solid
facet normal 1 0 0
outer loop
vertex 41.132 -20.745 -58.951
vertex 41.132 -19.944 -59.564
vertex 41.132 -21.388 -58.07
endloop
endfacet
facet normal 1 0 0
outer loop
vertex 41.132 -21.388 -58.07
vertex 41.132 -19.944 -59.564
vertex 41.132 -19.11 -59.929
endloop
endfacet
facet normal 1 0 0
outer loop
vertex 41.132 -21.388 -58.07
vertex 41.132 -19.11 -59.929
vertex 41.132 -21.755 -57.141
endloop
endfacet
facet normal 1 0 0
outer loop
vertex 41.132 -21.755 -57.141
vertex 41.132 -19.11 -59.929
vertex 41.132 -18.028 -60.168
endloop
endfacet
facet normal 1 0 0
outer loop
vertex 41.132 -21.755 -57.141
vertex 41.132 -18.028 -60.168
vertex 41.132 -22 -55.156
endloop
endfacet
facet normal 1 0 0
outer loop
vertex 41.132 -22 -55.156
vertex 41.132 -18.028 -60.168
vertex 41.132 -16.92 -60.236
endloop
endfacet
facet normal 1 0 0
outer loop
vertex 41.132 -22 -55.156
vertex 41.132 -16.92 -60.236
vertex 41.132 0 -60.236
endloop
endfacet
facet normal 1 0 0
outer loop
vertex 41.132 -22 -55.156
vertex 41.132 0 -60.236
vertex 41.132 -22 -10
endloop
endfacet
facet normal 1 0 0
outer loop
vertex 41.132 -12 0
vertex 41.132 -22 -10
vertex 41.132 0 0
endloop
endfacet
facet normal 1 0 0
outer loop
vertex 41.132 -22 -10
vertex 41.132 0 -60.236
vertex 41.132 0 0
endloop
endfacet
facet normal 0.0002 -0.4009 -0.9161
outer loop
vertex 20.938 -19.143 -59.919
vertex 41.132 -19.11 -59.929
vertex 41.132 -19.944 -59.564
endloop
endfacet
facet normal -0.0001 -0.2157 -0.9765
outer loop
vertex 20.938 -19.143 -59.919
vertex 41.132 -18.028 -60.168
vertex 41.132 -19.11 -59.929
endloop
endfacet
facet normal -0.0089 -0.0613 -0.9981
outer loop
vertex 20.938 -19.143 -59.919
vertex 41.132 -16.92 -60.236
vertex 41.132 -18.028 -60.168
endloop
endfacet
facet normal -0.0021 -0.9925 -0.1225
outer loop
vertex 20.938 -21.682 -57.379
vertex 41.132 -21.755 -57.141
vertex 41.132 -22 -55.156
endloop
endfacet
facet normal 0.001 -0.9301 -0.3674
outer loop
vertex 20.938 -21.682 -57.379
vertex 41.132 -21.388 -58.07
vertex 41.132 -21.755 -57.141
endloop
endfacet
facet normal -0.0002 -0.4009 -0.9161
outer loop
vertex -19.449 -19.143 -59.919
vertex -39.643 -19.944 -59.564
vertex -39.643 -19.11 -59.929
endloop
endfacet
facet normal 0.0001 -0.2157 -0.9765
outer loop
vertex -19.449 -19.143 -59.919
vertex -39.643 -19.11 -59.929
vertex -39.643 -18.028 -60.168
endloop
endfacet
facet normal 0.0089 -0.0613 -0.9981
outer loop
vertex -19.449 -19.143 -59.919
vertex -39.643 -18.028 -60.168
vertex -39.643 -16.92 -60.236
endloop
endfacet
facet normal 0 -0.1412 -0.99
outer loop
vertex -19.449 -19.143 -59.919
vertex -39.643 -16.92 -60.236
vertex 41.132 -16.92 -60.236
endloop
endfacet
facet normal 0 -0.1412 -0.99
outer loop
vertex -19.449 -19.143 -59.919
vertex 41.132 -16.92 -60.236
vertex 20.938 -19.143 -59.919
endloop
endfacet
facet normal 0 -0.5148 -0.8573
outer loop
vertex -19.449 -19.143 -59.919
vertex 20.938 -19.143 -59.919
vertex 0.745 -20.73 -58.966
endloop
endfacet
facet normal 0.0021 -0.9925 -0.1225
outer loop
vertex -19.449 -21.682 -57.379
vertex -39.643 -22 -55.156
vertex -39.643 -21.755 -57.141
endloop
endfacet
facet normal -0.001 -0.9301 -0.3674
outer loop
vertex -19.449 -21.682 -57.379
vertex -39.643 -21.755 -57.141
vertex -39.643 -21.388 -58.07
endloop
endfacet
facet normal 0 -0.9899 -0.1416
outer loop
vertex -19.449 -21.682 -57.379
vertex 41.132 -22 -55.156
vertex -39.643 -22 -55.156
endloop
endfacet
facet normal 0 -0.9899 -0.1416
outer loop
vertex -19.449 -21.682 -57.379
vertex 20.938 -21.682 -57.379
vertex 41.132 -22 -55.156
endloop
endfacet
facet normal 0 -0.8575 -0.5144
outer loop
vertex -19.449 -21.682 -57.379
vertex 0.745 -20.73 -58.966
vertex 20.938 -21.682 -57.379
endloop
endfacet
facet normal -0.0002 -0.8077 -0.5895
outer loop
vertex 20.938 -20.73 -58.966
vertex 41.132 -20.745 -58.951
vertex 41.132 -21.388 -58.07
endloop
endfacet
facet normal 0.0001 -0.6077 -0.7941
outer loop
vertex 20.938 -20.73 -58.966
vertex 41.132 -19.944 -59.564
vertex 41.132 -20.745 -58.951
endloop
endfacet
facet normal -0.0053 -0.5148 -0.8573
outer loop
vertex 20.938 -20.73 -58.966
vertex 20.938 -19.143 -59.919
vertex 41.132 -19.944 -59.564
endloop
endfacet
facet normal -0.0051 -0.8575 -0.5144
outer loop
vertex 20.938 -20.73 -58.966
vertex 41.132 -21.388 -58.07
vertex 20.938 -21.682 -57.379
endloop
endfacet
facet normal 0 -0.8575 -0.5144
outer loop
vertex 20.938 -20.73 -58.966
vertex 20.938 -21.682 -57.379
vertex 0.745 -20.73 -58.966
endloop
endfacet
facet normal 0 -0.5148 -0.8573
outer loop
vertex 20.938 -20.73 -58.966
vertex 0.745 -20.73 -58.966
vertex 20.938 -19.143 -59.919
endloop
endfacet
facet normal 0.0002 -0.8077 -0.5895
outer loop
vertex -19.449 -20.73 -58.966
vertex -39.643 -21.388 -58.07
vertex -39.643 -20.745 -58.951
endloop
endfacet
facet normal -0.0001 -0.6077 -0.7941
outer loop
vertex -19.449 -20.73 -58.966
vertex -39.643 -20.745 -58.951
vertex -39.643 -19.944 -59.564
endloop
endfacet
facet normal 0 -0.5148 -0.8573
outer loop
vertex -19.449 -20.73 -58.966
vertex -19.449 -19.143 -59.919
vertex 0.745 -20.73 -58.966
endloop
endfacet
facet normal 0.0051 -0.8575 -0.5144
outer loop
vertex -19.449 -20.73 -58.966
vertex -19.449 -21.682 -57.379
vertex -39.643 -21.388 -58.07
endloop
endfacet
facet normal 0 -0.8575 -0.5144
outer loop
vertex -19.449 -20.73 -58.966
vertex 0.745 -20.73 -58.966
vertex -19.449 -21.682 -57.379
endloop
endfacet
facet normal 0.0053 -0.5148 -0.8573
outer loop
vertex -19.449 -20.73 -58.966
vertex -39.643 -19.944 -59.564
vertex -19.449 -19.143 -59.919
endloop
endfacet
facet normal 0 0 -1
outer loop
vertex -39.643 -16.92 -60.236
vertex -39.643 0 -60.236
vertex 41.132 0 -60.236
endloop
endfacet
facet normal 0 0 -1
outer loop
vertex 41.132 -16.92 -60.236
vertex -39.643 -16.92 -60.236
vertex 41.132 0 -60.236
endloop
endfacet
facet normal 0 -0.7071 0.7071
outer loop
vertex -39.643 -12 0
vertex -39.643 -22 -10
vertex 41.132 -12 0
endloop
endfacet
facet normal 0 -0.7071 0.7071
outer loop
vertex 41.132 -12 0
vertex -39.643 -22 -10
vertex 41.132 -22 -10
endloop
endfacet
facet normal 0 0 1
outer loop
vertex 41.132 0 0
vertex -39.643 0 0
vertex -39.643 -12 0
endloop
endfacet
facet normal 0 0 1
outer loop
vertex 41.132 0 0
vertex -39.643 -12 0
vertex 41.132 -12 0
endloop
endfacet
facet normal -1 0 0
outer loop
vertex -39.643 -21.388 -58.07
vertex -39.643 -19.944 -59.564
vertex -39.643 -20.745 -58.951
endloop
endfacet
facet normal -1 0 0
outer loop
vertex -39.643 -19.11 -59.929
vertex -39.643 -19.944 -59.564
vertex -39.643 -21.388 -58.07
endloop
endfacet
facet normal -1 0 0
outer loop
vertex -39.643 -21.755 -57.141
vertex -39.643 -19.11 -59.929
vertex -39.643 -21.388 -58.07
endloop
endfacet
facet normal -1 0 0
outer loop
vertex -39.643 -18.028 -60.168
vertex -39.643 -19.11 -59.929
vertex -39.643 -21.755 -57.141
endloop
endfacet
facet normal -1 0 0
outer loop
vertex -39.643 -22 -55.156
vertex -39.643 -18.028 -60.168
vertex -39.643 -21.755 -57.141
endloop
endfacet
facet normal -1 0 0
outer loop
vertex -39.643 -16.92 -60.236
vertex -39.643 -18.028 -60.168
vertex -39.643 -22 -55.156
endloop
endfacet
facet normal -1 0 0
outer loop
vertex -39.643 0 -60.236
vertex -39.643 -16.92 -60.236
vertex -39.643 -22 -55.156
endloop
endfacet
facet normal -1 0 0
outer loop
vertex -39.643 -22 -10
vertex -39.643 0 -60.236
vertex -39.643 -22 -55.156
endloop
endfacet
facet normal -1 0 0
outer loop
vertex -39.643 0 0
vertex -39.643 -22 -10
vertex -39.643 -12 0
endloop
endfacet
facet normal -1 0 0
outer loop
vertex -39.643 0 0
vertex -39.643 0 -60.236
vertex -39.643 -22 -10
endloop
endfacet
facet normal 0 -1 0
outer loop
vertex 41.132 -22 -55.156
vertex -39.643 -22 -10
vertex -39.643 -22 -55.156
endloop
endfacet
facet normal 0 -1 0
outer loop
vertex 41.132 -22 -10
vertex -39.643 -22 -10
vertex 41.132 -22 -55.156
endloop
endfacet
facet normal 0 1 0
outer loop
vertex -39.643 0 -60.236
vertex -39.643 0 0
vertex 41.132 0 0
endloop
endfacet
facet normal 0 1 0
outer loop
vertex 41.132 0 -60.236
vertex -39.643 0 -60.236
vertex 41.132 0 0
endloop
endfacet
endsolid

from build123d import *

# Parameters (mm, degrees)
F0_W        = 80.775000155
F0_H        = 60.2360032499
F1_DEPTH    = 22
F2_T1_DEPTH = 106.175000155
F3_SIZE     = 10


# Not quite as in the source:
# - a fillet or chamfer that OpenCascade refuses, or shapes differently, is made with other operations: its cross-section is extruded or revolved along the edge and cut away or added


with BuildPart() as f1:
    # F0 (on Front) → F1 (new body)
    with BuildSketch(Plane.XZ):
        with Locations((0.7447451353, -30.1180016249)):
            Rectangle(F0_W, F0_H)
    extrude(amount=F1_DEPTH)

    # F2: fillet of radius 5.08 on 1 edges, made by hand

    # F2_s2 → F2_t1 (cut)
    with BuildSketch(Plane.YZ.offset(-52.3427549422)):
        with BuildLine():
            add(Edge.make_bspline(
                [(-16.92, -60.2360032499), (-22, -60.2360032499), (-22, -55.1560032499)],
                knots=[0, 0, 0, 1, 1, 1], degree=2, weights=[1, 1, 1]))
            Line((-22, -55.1560032499), (-22, -60.2360032499))
            Line((-22, -60.2360032499), (-16.92, -60.2360032499))
        make_face()
    extrude(amount=F2_T1_DEPTH, mode=Mode.SUBTRACT)

    # F3
    f3_edges = [f1.edges().sort_by_distance(p)[0] for p in [
        (0.744745, -22, 0),
    ]]
    chamfer(f3_edges, length=F3_SIZE)


solid = f1.part
